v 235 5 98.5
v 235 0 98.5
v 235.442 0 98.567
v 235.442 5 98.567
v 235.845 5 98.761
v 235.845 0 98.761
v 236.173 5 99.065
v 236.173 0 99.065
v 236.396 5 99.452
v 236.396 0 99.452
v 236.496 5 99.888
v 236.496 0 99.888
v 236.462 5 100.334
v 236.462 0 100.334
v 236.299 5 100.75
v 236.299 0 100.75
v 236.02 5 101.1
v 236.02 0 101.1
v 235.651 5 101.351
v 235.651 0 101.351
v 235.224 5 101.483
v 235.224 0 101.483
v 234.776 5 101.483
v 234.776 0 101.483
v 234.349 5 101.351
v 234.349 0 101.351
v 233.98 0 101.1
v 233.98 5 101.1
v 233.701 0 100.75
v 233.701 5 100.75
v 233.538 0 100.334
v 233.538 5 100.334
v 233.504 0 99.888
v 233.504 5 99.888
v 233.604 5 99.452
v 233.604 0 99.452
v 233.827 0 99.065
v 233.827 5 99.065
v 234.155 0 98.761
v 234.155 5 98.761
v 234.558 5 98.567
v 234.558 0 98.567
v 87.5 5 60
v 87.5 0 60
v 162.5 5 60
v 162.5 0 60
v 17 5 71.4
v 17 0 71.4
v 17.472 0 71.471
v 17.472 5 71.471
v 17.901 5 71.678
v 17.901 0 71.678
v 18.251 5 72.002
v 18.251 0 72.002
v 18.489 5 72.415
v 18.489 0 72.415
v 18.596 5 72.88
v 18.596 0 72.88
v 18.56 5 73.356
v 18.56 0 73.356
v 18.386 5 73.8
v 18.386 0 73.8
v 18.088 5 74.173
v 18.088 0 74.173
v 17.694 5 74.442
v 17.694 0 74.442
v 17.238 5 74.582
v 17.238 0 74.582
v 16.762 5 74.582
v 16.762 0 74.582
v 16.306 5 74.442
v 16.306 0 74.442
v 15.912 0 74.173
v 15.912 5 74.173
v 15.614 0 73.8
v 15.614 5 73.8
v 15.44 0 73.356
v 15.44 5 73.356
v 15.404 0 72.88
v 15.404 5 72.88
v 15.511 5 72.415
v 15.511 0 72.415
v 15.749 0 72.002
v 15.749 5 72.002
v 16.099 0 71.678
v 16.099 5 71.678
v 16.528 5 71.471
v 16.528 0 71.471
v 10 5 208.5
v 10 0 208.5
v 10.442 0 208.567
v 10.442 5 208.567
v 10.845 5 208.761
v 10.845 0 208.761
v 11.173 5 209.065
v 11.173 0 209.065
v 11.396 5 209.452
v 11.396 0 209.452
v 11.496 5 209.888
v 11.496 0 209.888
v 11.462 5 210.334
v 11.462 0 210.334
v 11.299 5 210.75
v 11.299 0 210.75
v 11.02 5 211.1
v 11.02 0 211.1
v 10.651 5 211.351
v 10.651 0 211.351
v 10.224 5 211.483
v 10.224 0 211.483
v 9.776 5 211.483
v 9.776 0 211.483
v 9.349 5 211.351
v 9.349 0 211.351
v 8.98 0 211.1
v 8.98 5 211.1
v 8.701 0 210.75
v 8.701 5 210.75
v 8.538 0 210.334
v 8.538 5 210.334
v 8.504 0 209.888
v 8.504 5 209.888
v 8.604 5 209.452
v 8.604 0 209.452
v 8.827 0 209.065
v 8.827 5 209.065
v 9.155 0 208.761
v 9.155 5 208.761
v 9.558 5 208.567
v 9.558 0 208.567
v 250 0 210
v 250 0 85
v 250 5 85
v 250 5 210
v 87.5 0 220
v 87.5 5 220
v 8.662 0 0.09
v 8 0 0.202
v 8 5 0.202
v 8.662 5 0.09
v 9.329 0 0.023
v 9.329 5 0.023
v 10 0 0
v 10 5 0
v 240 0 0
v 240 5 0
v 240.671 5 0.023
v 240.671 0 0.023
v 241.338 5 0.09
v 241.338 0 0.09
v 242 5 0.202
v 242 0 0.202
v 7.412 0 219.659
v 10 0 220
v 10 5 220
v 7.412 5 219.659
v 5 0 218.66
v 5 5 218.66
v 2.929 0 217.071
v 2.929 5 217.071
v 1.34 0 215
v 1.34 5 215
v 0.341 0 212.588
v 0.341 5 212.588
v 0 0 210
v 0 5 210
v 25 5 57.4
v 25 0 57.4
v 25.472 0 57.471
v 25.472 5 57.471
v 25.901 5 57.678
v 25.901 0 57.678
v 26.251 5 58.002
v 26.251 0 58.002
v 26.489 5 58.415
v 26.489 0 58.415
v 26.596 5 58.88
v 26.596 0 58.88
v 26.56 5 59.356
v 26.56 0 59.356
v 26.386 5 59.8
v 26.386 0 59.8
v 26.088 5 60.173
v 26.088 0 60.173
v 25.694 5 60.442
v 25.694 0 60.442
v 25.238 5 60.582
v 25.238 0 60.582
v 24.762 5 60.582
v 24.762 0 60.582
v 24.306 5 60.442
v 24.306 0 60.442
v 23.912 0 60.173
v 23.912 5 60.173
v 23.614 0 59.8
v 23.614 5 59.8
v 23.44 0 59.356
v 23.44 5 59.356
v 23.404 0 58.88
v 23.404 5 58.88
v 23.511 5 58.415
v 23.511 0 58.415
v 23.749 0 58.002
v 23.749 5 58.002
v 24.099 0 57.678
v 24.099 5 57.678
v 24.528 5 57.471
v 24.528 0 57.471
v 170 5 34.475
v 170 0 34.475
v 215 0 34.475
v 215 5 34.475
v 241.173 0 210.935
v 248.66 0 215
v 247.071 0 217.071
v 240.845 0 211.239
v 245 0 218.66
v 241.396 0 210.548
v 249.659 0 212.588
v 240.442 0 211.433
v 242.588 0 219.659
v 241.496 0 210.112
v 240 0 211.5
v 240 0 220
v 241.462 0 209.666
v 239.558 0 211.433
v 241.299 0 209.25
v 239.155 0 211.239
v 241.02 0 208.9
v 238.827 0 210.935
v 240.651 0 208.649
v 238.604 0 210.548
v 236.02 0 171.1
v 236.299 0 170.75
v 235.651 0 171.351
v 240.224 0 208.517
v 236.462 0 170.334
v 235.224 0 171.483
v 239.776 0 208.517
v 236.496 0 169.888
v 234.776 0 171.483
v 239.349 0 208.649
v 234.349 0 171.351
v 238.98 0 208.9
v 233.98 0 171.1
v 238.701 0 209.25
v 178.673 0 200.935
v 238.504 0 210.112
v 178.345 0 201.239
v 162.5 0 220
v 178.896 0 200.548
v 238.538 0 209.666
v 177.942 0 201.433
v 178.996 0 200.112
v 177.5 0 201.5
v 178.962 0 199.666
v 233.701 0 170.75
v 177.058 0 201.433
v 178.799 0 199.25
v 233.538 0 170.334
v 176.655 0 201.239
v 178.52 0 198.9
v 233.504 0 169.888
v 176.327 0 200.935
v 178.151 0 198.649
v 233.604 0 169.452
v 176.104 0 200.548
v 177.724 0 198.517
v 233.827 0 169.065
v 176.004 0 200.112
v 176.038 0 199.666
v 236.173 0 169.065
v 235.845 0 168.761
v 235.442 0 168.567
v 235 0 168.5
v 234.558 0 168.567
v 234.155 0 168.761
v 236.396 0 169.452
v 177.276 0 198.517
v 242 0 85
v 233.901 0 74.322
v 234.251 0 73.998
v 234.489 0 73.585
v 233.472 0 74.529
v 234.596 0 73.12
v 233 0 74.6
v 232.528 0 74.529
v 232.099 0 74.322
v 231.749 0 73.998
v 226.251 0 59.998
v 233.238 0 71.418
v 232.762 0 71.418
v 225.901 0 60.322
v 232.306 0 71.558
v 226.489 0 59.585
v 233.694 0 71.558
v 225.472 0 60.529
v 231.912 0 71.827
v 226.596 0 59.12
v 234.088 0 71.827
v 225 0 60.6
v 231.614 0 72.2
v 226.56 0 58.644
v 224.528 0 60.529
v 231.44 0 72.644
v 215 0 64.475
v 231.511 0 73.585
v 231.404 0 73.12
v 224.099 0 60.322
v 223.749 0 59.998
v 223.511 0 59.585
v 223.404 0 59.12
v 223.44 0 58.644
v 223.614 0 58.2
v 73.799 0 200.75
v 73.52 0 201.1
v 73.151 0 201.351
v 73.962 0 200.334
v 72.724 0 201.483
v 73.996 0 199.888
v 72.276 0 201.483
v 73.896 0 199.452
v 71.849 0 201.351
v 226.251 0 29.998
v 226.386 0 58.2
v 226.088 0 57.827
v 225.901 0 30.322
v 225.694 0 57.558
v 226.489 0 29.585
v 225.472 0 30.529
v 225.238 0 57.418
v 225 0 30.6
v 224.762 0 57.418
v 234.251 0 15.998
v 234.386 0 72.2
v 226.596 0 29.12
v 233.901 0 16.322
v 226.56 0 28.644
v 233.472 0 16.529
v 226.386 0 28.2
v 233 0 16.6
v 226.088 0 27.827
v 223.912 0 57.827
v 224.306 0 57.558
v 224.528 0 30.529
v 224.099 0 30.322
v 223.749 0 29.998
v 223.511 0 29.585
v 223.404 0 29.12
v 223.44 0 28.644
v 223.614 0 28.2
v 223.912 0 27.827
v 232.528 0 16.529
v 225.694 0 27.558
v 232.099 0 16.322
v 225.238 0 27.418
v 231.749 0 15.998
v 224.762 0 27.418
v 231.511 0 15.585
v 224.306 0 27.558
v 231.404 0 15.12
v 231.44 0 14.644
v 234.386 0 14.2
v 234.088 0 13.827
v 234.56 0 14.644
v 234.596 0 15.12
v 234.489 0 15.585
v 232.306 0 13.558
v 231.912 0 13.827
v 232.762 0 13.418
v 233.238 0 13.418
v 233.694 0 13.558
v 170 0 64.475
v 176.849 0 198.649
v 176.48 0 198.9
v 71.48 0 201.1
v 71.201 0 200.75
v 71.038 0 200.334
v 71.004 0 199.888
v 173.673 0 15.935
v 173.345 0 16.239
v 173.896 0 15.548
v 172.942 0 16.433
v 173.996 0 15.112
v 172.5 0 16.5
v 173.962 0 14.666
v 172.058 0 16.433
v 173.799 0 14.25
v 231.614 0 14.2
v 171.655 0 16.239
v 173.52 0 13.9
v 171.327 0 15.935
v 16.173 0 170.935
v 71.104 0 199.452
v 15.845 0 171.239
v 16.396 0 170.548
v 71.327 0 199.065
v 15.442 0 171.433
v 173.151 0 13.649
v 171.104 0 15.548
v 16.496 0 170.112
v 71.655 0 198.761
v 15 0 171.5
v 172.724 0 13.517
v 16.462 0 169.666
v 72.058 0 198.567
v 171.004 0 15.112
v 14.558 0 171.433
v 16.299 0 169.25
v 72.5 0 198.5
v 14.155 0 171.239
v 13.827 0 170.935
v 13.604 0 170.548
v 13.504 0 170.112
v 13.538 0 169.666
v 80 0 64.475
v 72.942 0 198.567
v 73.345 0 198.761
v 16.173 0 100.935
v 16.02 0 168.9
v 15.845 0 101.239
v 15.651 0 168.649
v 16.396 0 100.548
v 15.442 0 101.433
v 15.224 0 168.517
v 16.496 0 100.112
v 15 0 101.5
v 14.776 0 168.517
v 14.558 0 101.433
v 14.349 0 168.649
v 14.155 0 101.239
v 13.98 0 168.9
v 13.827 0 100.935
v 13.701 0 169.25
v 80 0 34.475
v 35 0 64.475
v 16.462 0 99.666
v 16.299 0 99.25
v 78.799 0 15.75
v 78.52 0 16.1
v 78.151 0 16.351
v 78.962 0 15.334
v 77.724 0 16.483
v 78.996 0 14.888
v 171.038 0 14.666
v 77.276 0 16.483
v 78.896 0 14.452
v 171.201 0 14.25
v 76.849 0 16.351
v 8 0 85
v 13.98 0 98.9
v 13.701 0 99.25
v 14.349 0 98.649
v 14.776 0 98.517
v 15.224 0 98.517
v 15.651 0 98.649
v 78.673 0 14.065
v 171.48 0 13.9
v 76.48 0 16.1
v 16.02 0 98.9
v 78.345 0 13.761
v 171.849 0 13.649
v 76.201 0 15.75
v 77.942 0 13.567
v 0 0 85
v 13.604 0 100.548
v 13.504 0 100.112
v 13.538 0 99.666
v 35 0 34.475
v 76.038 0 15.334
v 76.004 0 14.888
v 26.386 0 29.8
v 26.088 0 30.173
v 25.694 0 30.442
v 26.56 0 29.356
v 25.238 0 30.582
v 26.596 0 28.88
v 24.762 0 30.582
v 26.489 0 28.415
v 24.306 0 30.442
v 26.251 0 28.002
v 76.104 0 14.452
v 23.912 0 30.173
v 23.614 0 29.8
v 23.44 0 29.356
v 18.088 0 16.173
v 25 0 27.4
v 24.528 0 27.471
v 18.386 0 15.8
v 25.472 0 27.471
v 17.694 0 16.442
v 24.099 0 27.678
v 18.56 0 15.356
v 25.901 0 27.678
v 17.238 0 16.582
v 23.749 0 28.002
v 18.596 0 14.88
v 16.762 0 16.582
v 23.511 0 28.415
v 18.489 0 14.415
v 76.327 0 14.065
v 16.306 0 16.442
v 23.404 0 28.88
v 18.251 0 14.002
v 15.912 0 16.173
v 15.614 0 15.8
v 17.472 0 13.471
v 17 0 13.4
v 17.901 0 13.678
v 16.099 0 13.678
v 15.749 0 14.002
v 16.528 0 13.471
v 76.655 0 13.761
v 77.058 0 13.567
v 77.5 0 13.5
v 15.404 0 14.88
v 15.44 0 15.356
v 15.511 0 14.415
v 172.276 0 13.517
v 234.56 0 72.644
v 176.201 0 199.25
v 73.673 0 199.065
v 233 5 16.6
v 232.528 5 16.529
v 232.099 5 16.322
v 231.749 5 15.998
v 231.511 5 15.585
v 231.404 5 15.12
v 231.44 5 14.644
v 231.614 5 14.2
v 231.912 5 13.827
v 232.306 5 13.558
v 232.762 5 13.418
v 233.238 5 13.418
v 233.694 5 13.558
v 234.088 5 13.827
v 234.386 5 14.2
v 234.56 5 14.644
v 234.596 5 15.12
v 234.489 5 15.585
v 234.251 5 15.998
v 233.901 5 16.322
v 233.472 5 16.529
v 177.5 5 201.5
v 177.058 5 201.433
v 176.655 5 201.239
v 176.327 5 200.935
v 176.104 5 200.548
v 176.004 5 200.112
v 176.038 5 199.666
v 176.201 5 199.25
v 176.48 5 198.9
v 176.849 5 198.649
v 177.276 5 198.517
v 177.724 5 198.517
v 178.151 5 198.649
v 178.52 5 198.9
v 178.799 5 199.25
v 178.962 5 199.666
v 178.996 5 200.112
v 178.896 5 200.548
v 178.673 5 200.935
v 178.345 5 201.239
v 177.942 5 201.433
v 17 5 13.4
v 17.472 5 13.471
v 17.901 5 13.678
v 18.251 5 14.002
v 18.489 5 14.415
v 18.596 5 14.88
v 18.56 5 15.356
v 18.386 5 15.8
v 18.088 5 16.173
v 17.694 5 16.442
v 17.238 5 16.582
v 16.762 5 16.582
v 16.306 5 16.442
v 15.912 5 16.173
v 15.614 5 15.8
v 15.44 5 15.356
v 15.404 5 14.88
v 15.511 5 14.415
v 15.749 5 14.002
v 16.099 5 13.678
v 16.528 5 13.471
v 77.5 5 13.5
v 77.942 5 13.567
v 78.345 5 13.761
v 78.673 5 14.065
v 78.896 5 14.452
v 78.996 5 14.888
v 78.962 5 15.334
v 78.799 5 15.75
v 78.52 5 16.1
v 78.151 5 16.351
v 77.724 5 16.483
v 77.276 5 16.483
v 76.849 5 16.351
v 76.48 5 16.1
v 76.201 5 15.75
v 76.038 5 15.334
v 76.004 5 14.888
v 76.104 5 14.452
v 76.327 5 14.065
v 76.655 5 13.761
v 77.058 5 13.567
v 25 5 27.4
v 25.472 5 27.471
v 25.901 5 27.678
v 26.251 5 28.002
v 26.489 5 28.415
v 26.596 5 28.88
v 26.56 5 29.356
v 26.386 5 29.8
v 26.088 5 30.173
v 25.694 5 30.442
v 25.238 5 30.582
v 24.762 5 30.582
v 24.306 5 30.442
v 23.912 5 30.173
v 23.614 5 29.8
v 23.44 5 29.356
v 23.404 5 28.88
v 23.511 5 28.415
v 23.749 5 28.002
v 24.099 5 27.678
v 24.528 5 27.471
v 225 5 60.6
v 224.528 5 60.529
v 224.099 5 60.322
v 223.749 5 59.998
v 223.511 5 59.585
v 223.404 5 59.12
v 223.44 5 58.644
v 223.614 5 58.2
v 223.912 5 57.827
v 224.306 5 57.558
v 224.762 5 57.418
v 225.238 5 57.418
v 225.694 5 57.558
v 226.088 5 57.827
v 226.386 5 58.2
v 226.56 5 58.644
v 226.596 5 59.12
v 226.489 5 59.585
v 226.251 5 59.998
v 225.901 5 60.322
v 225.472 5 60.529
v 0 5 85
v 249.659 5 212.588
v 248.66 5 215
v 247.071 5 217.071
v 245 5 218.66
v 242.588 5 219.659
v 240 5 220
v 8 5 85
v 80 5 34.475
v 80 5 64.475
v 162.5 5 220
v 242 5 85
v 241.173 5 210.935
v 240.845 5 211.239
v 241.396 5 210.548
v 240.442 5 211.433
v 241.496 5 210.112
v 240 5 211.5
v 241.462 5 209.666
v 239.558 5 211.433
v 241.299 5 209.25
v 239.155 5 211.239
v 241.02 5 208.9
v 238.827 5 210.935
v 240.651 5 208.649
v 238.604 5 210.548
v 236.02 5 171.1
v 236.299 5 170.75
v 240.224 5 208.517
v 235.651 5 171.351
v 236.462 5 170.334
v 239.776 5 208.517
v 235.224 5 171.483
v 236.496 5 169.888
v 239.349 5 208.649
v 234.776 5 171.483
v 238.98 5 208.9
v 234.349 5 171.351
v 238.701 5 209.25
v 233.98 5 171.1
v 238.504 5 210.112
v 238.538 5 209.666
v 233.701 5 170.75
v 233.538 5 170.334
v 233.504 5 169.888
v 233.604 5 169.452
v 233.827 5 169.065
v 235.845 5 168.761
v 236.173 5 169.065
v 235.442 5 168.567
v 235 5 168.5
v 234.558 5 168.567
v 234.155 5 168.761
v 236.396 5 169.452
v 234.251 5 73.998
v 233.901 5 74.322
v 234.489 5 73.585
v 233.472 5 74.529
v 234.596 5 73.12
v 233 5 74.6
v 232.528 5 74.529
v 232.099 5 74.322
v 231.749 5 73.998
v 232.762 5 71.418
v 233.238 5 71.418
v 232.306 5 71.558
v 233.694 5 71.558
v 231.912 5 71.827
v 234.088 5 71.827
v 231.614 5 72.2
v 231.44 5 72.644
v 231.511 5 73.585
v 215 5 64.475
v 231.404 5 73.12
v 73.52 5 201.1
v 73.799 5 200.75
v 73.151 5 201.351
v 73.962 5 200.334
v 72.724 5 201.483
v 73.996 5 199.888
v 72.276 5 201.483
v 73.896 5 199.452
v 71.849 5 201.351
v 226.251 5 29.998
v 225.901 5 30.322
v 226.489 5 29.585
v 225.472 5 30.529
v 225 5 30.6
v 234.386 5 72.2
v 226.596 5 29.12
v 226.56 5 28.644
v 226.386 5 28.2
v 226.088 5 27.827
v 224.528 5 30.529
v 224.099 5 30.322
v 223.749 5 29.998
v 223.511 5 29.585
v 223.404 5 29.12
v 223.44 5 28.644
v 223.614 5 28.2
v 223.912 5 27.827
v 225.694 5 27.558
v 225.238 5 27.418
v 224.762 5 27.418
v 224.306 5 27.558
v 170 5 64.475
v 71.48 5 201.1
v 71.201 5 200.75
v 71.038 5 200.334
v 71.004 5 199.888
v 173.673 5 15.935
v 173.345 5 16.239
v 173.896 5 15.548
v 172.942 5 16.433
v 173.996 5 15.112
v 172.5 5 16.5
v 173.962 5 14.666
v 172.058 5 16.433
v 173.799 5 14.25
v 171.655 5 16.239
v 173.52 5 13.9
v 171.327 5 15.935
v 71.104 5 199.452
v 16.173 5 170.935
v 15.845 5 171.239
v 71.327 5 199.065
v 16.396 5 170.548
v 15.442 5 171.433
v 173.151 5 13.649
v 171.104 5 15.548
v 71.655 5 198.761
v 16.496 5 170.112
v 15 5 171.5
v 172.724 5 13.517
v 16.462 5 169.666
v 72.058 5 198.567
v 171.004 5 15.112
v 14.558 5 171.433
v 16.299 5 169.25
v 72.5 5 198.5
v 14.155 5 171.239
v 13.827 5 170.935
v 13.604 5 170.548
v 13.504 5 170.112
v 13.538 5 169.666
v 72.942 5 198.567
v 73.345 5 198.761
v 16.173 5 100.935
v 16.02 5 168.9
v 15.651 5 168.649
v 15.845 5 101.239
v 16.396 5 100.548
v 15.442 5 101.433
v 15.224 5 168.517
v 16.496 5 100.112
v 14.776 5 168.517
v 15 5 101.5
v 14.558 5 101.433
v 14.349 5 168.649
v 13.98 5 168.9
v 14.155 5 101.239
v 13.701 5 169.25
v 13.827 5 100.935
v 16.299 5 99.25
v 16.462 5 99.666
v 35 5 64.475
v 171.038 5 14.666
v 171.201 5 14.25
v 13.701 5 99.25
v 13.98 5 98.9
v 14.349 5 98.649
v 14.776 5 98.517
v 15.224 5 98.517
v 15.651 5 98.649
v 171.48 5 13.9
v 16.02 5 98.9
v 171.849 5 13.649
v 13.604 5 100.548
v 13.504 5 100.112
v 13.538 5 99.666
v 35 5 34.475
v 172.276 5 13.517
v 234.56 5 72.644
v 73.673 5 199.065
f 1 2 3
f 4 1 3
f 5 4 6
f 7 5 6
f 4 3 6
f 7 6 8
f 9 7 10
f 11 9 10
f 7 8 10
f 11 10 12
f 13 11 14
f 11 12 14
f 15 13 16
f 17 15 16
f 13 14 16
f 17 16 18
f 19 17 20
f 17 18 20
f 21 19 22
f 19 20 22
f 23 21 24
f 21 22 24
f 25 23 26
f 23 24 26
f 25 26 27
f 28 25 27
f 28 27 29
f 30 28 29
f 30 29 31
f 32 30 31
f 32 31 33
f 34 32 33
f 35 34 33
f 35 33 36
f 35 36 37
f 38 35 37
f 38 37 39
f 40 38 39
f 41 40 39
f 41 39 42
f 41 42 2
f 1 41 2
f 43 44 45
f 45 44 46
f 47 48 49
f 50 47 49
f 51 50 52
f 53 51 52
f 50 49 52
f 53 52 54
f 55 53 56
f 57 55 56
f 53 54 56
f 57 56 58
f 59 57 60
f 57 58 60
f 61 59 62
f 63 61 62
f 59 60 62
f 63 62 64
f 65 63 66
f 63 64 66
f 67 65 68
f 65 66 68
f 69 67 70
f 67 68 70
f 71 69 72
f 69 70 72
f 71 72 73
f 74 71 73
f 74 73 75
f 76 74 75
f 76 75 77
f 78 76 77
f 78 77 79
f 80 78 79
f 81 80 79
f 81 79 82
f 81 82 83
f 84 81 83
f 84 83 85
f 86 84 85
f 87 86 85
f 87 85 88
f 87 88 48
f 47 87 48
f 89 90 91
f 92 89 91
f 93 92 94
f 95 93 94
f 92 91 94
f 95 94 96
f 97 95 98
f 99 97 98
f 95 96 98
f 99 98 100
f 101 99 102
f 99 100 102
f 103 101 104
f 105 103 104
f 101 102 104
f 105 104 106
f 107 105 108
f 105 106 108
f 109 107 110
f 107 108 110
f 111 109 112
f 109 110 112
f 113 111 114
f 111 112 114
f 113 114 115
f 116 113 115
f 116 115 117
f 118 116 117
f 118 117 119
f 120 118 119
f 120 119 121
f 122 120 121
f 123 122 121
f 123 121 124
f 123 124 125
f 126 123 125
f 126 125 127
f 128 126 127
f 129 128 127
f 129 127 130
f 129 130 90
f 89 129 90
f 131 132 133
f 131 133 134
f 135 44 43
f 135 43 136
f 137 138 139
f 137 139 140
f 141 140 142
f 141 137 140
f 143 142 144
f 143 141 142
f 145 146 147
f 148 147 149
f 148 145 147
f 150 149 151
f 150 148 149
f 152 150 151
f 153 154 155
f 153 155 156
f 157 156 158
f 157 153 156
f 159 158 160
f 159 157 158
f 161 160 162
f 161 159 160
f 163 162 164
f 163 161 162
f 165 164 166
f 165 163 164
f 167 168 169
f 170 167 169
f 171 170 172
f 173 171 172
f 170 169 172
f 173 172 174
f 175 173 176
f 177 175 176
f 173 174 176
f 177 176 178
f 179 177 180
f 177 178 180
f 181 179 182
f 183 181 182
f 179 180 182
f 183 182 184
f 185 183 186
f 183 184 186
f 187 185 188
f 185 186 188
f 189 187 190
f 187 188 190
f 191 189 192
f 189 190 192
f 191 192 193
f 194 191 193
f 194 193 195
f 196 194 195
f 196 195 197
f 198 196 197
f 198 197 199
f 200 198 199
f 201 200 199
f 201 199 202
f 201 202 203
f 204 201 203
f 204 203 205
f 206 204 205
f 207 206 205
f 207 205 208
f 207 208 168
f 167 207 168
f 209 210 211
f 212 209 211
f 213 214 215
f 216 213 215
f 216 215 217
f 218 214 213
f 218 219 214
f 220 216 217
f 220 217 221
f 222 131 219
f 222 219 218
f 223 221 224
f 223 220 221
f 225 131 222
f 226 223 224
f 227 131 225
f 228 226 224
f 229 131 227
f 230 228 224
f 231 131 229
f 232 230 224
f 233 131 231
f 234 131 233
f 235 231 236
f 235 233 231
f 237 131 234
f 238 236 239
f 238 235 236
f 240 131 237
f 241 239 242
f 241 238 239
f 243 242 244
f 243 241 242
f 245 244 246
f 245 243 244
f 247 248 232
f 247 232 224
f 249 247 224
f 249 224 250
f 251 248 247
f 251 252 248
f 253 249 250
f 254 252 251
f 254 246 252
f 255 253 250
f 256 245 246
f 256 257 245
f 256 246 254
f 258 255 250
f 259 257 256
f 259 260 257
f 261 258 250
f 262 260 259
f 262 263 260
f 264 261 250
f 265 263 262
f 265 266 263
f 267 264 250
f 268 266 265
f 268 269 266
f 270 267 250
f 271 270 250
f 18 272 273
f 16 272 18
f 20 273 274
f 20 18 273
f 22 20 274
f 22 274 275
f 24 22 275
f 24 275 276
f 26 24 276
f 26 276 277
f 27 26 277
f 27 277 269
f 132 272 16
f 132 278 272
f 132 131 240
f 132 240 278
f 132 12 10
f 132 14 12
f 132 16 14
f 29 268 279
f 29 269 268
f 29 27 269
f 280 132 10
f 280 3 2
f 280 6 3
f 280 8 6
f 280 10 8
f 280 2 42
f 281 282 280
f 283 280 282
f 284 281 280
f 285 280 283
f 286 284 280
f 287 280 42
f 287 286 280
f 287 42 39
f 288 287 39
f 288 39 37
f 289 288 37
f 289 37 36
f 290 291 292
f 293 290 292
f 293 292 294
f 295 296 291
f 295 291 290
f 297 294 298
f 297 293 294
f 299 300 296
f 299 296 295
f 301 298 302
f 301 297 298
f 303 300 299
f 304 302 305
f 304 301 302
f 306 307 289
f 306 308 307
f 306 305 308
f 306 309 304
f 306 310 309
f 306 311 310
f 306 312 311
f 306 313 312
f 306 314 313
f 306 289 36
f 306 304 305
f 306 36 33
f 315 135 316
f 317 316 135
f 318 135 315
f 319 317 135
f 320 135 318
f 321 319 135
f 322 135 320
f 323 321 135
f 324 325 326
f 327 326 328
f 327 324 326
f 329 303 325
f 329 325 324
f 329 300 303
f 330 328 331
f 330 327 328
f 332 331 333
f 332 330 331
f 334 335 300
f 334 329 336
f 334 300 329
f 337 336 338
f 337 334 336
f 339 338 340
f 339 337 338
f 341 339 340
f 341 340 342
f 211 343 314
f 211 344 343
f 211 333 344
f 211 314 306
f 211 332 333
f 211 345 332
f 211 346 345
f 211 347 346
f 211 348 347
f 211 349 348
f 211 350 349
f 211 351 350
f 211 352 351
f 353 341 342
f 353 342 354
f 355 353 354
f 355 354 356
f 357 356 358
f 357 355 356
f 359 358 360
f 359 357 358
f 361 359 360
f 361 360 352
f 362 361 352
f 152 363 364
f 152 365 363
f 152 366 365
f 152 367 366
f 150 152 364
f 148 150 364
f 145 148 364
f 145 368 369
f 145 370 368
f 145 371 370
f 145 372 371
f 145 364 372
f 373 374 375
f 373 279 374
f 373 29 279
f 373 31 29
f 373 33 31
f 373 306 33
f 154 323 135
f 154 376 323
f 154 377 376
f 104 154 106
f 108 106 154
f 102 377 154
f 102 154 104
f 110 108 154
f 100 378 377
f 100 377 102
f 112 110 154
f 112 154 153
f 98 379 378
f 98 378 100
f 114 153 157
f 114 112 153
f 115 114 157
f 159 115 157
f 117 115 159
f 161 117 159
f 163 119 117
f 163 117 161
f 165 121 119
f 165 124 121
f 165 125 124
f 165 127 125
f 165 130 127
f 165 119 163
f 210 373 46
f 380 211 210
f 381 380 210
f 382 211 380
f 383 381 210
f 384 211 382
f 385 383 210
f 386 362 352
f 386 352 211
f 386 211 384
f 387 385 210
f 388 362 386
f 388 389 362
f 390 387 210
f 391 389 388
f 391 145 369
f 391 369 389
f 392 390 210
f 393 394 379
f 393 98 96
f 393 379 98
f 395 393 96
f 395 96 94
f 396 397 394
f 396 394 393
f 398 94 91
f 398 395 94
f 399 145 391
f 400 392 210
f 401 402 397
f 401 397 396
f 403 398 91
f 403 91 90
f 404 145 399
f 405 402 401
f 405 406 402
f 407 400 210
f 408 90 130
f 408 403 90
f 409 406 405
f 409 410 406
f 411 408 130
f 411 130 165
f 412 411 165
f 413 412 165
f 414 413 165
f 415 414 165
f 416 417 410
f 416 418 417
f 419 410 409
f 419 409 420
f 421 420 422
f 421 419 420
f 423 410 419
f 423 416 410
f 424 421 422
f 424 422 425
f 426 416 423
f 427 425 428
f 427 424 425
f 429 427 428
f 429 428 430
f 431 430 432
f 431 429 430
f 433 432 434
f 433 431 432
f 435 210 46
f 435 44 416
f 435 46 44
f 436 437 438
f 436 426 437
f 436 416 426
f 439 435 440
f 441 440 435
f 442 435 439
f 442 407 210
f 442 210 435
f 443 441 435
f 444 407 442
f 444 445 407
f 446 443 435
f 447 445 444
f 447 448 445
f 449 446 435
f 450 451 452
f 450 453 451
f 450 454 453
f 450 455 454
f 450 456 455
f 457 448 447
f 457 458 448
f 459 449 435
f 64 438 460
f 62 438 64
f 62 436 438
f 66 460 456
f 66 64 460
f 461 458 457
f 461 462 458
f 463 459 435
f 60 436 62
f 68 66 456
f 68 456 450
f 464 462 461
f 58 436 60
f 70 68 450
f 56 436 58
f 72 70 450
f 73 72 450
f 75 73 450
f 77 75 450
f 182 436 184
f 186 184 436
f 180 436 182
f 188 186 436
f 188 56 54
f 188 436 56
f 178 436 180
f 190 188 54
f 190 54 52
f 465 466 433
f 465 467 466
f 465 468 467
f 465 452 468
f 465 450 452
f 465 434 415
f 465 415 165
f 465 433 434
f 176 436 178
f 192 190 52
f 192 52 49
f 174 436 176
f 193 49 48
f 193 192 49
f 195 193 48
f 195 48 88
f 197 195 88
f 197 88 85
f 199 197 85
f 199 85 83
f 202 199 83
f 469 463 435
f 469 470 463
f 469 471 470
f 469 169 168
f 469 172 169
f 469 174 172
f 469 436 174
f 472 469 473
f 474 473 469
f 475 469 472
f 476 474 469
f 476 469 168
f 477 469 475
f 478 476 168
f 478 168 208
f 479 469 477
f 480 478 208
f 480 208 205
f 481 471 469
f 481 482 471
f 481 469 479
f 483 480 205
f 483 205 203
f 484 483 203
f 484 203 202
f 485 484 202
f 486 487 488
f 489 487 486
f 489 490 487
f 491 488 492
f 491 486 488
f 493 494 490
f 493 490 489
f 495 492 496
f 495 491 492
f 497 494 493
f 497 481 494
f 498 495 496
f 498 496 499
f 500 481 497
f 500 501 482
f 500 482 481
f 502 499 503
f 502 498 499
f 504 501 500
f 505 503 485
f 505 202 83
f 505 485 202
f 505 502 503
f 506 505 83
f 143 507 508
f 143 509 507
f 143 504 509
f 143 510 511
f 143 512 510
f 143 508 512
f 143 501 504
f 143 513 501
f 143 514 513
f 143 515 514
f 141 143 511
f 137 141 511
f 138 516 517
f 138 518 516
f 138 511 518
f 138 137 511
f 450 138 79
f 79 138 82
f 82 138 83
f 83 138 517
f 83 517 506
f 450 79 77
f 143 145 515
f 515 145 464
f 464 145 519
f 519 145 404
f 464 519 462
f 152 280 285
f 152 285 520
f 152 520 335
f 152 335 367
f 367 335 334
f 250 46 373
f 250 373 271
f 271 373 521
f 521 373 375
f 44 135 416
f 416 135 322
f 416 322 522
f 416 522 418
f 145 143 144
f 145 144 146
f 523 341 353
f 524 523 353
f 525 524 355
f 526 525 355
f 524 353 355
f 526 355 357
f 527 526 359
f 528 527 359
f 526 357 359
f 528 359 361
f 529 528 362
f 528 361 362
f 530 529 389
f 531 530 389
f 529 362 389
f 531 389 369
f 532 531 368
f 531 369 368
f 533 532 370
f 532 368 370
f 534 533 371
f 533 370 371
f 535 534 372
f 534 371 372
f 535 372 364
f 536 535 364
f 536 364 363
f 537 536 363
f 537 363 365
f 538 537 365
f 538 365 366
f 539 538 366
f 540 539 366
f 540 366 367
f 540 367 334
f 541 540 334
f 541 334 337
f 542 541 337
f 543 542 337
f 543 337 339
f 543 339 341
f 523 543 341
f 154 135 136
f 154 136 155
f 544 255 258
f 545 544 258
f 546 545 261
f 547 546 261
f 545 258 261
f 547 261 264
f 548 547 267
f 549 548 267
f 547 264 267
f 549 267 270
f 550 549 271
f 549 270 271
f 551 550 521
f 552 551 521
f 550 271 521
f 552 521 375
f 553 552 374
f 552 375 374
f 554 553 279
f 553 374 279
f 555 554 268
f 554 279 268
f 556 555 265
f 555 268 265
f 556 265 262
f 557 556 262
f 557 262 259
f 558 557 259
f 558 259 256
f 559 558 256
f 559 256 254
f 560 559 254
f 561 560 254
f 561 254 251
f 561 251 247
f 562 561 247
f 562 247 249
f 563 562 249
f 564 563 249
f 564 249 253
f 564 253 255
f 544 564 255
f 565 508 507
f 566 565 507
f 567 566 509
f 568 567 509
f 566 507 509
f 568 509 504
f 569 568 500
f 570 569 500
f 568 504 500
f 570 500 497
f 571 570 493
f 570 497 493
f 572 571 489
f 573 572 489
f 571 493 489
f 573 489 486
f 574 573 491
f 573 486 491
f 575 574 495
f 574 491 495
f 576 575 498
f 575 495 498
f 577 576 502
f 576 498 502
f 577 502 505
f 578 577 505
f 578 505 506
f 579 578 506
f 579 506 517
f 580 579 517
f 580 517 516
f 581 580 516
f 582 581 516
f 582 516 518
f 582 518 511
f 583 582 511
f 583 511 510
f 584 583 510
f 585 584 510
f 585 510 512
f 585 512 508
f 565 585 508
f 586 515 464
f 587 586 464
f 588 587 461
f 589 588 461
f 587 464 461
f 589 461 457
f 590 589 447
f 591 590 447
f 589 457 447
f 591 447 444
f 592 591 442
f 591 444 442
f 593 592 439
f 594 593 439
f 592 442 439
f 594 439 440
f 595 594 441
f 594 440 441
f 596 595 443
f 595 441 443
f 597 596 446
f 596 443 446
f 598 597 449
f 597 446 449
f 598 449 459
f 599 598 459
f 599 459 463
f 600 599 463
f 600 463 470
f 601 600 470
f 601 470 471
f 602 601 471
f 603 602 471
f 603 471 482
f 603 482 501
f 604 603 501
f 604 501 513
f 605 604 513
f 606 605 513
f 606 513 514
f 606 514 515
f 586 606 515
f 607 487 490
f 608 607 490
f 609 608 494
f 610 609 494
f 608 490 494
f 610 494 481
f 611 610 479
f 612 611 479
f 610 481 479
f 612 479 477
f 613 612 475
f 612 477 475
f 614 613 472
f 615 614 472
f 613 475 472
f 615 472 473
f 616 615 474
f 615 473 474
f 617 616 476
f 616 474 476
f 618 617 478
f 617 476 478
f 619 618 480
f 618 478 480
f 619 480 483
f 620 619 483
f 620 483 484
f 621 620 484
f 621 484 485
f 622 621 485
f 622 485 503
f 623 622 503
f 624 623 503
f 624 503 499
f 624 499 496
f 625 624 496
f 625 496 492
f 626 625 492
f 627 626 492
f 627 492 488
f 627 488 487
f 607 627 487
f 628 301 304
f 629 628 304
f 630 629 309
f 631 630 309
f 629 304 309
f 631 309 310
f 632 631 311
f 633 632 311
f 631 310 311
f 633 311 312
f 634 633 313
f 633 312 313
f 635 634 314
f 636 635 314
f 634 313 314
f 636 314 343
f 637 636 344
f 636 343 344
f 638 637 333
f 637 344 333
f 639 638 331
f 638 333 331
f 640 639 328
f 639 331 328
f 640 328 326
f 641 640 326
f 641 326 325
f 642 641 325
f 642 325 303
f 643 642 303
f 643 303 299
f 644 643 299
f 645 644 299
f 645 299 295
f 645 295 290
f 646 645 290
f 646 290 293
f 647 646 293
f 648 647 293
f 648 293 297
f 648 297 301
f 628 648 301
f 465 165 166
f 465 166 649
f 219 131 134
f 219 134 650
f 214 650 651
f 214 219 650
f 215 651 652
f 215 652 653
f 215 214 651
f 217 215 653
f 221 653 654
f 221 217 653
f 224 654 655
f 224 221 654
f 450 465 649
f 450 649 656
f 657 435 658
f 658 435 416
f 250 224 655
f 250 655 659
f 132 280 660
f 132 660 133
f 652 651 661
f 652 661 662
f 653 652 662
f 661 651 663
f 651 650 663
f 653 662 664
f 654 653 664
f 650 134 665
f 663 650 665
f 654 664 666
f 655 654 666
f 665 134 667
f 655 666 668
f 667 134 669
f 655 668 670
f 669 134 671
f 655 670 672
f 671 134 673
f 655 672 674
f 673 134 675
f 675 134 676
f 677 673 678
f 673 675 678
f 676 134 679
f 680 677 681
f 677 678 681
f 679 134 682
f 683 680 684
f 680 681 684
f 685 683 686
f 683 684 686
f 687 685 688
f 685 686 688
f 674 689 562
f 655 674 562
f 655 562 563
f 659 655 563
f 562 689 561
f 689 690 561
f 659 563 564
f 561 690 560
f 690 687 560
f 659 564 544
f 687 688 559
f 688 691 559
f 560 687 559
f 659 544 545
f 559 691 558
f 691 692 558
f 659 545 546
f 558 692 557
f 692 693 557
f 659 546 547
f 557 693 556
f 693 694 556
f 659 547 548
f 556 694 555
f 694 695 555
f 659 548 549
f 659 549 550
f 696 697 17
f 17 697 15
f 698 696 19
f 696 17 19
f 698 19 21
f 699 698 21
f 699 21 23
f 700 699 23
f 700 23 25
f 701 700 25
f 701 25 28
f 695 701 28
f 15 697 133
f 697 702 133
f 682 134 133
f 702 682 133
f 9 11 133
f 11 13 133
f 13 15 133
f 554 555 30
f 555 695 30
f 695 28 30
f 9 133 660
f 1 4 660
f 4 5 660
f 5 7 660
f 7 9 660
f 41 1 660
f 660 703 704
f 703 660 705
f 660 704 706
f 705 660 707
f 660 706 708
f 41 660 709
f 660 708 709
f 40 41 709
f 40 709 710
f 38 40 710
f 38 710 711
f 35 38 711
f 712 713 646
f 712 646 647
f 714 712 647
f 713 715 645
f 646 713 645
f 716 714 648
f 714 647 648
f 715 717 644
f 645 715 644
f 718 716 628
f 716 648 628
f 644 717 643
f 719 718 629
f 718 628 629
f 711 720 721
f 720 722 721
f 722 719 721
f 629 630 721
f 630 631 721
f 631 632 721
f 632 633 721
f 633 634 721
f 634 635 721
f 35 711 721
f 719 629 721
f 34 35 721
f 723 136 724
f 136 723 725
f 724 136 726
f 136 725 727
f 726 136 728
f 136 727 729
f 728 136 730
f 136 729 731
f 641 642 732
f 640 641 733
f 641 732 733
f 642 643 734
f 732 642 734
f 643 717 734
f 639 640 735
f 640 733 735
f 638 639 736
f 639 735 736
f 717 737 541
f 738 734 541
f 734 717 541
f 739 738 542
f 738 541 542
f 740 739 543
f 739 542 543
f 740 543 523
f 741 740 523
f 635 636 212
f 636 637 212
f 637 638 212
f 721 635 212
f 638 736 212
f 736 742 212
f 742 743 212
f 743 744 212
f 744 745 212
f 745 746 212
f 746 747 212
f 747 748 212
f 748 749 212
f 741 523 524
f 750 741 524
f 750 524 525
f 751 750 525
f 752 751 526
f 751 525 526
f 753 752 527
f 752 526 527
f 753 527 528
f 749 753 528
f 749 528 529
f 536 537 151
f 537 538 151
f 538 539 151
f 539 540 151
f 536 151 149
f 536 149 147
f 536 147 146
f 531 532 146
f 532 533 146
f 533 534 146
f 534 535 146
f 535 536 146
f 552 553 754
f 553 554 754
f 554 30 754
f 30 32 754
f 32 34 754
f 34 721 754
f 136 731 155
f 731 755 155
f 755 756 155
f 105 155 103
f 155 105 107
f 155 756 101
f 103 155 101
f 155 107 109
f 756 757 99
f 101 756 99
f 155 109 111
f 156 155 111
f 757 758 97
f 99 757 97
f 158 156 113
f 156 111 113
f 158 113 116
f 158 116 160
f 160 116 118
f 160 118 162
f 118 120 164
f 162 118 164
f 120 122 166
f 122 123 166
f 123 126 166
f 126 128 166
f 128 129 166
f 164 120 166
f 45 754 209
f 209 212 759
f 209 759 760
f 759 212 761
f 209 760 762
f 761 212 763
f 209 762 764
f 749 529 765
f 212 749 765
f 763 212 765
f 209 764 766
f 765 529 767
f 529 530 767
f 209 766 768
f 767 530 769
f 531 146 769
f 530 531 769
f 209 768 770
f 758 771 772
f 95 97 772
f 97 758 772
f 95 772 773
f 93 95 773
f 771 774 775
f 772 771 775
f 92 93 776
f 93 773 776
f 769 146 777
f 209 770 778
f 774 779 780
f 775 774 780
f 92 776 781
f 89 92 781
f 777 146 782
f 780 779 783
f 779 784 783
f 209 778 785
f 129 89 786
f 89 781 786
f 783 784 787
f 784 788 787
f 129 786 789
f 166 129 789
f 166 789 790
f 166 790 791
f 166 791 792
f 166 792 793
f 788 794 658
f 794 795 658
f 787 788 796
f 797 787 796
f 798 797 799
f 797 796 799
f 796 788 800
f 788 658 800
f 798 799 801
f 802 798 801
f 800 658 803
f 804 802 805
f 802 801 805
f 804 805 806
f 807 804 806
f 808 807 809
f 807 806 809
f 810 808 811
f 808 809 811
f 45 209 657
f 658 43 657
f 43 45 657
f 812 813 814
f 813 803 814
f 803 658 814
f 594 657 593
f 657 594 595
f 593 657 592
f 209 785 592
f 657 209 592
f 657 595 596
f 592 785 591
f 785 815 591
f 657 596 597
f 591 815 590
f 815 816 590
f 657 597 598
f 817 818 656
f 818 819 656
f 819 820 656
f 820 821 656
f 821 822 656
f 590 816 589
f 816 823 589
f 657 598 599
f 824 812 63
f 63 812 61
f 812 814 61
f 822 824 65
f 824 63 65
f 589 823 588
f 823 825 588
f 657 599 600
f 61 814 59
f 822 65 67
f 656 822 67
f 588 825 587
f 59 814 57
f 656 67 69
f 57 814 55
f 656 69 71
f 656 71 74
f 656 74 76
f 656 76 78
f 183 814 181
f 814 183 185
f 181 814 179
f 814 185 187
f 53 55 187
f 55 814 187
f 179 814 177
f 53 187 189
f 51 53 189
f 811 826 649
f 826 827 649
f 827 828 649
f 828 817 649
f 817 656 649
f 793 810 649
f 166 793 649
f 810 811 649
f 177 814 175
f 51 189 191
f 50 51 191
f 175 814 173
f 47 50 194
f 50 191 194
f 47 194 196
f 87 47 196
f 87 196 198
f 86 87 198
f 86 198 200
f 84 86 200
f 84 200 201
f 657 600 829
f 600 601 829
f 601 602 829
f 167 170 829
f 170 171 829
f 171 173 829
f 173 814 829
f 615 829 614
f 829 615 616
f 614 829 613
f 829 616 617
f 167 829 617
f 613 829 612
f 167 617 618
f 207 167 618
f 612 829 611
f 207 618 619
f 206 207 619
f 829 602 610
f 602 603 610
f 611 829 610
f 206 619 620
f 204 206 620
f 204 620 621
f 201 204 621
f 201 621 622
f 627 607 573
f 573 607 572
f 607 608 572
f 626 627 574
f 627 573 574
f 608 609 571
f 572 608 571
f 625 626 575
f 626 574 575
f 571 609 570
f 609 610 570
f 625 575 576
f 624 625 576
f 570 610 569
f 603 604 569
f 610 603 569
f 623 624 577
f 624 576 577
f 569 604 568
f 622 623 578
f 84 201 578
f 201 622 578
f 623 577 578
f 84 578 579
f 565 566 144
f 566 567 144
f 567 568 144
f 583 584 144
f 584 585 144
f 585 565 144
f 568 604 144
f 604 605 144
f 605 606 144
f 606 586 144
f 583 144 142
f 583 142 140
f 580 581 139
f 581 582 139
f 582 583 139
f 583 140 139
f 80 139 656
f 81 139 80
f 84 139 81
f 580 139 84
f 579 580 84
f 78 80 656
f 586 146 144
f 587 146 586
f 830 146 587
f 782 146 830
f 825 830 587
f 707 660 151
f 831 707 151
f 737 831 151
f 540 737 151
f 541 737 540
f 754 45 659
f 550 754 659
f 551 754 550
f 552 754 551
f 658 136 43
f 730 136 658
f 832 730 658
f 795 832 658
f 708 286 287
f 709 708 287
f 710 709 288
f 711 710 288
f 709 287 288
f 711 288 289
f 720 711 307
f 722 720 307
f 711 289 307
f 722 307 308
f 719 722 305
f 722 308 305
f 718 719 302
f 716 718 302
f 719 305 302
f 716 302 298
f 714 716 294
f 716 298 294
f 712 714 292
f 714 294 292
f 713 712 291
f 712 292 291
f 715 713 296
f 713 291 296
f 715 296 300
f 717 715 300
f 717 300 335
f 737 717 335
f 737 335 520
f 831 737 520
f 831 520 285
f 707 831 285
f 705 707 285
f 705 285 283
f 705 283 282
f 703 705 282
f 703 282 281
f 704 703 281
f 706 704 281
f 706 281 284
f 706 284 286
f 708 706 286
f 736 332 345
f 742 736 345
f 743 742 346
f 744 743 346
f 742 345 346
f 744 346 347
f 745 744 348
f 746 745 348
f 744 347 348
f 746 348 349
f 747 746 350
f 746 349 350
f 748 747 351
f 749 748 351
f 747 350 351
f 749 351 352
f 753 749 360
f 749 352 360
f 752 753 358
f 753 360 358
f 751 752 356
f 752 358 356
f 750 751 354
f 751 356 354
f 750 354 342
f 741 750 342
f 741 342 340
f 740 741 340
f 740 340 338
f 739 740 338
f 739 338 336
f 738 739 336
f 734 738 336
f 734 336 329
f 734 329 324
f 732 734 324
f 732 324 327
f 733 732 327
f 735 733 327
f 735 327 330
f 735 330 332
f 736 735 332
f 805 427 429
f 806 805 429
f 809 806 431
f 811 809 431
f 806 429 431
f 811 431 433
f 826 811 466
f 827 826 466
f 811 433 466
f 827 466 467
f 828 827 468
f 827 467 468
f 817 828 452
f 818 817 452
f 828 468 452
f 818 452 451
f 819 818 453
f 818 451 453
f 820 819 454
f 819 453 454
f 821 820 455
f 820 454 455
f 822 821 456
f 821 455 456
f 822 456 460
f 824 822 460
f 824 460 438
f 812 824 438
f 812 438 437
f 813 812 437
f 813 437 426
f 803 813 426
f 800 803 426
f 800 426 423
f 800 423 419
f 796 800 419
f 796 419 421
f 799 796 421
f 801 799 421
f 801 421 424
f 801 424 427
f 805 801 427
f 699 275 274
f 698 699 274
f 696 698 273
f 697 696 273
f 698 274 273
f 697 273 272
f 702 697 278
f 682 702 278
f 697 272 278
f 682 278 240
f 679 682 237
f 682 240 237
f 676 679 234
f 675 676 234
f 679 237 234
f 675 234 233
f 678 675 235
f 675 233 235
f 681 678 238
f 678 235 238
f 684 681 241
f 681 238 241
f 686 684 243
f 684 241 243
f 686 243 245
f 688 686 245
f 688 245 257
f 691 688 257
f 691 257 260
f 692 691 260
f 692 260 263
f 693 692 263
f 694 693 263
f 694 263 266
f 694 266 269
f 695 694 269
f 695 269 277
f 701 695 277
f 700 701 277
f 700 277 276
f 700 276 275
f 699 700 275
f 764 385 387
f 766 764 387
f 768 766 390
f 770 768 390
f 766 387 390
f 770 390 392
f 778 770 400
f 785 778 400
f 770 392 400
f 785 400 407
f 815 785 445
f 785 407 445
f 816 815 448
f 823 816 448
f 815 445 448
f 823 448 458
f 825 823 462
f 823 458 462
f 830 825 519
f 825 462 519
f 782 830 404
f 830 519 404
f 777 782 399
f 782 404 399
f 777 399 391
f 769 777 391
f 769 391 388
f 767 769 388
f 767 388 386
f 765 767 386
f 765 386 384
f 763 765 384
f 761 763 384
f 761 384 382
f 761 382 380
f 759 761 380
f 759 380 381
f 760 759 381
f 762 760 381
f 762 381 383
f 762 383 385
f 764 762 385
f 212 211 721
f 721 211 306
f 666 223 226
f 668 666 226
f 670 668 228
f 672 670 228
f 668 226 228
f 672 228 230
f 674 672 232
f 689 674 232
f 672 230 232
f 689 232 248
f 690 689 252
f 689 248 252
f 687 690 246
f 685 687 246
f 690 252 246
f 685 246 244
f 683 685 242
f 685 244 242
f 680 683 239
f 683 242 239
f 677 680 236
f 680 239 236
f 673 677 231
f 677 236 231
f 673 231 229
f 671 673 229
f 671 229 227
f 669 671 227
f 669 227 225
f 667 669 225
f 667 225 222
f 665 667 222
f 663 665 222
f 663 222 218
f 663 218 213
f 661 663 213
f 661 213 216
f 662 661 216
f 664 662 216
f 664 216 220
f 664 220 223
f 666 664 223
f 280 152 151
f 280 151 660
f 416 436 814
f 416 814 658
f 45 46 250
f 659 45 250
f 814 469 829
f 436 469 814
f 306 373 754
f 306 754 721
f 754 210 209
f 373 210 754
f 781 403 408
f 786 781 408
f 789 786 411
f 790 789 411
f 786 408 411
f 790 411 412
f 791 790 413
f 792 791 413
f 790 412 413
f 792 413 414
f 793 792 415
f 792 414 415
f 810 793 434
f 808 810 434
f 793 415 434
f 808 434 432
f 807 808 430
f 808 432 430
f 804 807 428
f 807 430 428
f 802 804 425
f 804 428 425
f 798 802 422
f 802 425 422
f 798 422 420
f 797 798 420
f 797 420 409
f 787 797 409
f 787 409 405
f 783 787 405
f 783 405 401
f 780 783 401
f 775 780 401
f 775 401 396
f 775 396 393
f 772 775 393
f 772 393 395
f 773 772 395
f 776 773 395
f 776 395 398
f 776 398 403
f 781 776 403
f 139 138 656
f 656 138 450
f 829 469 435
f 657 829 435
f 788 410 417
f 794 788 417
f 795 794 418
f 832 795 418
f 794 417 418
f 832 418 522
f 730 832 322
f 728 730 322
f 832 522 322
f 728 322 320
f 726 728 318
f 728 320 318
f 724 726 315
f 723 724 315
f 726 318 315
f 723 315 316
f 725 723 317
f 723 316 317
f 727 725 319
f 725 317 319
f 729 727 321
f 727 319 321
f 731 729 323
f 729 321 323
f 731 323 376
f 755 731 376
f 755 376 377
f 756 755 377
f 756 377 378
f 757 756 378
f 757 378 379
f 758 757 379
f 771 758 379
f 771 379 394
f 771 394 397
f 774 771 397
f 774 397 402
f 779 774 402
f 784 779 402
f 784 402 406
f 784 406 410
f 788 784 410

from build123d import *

# Parameters (mm, degrees)
EXTRUDE_1_DEPTH      = 5
SKETCH_4_W           = 45
SKETCH_4_H           = 30
CUT_EXTRUDE_3_DEPTH  = 5
SKETCH_5_W           = 75
SKETCH_5_H           = 160
CUT_EXTRUDE_4_DEPTH  = 5
CUT_EXTRUDE_5_REACH  = 335.054
SKETCH_6_R           = 1.5
CUT_EXTRUDE_7_REACH  = 335.054
SKETCH_7_R           = 1.6
CUT_EXTRUDE_8_REACH  = 335.054
SKETCH_8_R           = 1.5
CUT_EXTRUDE_9_REACH  = 335.054
SKETCH_9_R           = 1.5
CUT_EXTRUDE_10_REACH = 335.054
SKETCH_10_W          = 8
SKETCH_10_H          = 85


with BuildPart() as part:
    # 草图1 → 凸台-拉伸1 (new body)
    with BuildSketch(Plane(origin=(0, 0, 0), x_dir=(1, 0, 0), z_dir=(0, 1, 0))):
        with BuildLine():
            Line((10, 0), (240, 0))
            ThreePointArc((240, 0), (247.071067812, -2.928932188), (250, -10))
            Line((250, -10), (250, -210))
            ThreePointArc((250, -210), (247.071067812, -217.071067812), (240, -220))
            Line((240, -220), (10, -220))
            ThreePointArc((10, -220), (2.928932188, -217.071067812), (0, -210))
            Line((0, -210), (0, -10))
            ThreePointArc((0, -10), (2.928932188, -2.928932188), (10, 0))
        make_face()
    extrude(amount=EXTRUDE_1_DEPTH)

    # 草图4 → 切除-拉伸3 (cut)
    with BuildSketch(Plane.XZ):
        with Locations((192.5, 49.475)):
            Rectangle(SKETCH_4_W, SKETCH_4_H)
        with Locations((57.5, 49.475)):
            Rectangle(SKETCH_4_W, SKETCH_4_H)
    extrude(amount=-CUT_EXTRUDE_3_DEPTH, mode=Mode.SUBTRACT)

    # 草图5 → 切除-拉伸4 (cut)
    with BuildSketch(Plane.XZ):
        with Locations((125, 140)):
            Rectangle(SKETCH_5_W, SKETCH_5_H)
    extrude(amount=-CUT_EXTRUDE_4_DEPTH, mode=Mode.SUBTRACT)

    # 草图6 → 切除-拉伸5 (cut, up to next)
    with BuildSketch(Plane.XZ, mode=Mode.PRIVATE) as cut_extrude_5_sk1:
        with Locations(Location((72.5, 200, 0), (0, 0, 270))):
            Circle(SKETCH_6_R)
    cut_extrude_5_tool1 = extrude(cut_extrude_5_sk1.sketch, amount=-CUT_EXTRUDE_5_REACH, mode=Mode.PRIVATE) & part.part
    # 草图6 → 切除-拉伸5 (cut, up to next)
    with BuildSketch(Plane.XZ, mode=Mode.PRIVATE) as cut_extrude_5_sk2:
        with Locations(Location((177.5, 200, 0), (0, 0, 90))):
            Circle(SKETCH_6_R)
    cut_extrude_5_tool2 = extrude(cut_extrude_5_sk2.sketch, amount=-CUT_EXTRUDE_5_REACH, mode=Mode.PRIVATE) & part.part
    add(cut_extrude_5_tool1.solids().sort_by_distance((72.5, 0, 200))[0], mode=Mode.SUBTRACT)
    add(cut_extrude_5_tool2.solids().sort_by_distance((177.5, 0, 200))[0], mode=Mode.SUBTRACT)

    # 草图7 → 切除-拉伸7 (cut, up to next)
    with BuildSketch(Plane.XZ, mode=Mode.PRIVATE) as cut_extrude_7_sk1:
        with Locations(Location((17, 15, 0), (0, 0, 270))):
            Circle(SKETCH_7_R)
    cut_extrude_7_tool1 = extrude(cut_extrude_7_sk1.sketch, amount=-CUT_EXTRUDE_7_REACH, mode=Mode.PRIVATE) & part.part
    # 草图7 → 切除-拉伸7 (cut, up to next)
    with BuildSketch(Plane.XZ, mode=Mode.PRIVATE) as cut_extrude_7_sk2:
        with Locations(Location((25, 29, 0), (0, 0, 270))):
            Circle(SKETCH_7_R)
    cut_extrude_7_tool2 = extrude(cut_extrude_7_sk2.sketch, amount=-CUT_EXTRUDE_7_REACH, mode=Mode.PRIVATE) & part.part
    # 草图7 → 切除-拉伸7 (cut, up to next)
    with BuildSketch(Plane.XZ, mode=Mode.PRIVATE) as cut_extrude_7_sk3:
        with Locations(Location((25, 59, 0), (0, 0, 270))):
            Circle(SKETCH_7_R)
    cut_extrude_7_tool3 = extrude(cut_extrude_7_sk3.sketch, amount=-CUT_EXTRUDE_7_REACH, mode=Mode.PRIVATE) & part.part
    # 草图7 → 切除-拉伸7 (cut, up to next)
    with BuildSketch(Plane.XZ, mode=Mode.PRIVATE) as cut_extrude_7_sk4:
        with Locations(Location((17, 73, 0), (0, 0, 270))):
            Circle(SKETCH_7_R)
    cut_extrude_7_tool4 = extrude(cut_extrude_7_sk4.sketch, amount=-CUT_EXTRUDE_7_REACH, mode=Mode.PRIVATE) & part.part
    # 草图7 → 切除-拉伸7 (cut, up to next)
    with BuildSketch(Plane.XZ, mode=Mode.PRIVATE) as cut_extrude_7_sk5:
        with Locations(Location((233, 73, 0), (0, 0, 90))):
            Circle(SKETCH_7_R)
    cut_extrude_7_tool5 = extrude(cut_extrude_7_sk5.sketch, amount=-CUT_EXTRUDE_7_REACH, mode=Mode.PRIVATE) & part.part
    # 草图7 → 切除-拉伸7 (cut, up to next)
    with BuildSketch(Plane.XZ, mode=Mode.PRIVATE) as cut_extrude_7_sk6:
        with Locations(Location((225, 59, 0), (0, 0, 90))):
            Circle(SKETCH_7_R)
    cut_extrude_7_tool6 = extrude(cut_extrude_7_sk6.sketch, amount=-CUT_EXTRUDE_7_REACH, mode=Mode.PRIVATE) & part.part
    # 草图7 → 切除-拉伸7 (cut, up to next)
    with BuildSketch(Plane.XZ, mode=Mode.PRIVATE) as cut_extrude_7_sk7:
        with Locations(Location((225, 29, 0), (0, 0, 90))):
            Circle(SKETCH_7_R)
    cut_extrude_7_tool7 = extrude(cut_extrude_7_sk7.sketch, amount=-CUT_EXTRUDE_7_REACH, mode=Mode.PRIVATE) & part.part
    # 草图7 → 切除-拉伸7 (cut, up to next)
    with BuildSketch(Plane.XZ, mode=Mode.PRIVATE) as cut_extrude_7_sk8:
        with Locations(Location((233, 15, 0), (0, 0, 90))):
            Circle(SKETCH_7_R)
    cut_extrude_7_tool8 = extrude(cut_extrude_7_sk8.sketch, amount=-CUT_EXTRUDE_7_REACH, mode=Mode.PRIVATE) & part.part
    add(cut_extrude_7_tool1.solids().sort_by_distance((17, 0, 15))[0], mode=Mode.SUBTRACT)
    add(cut_extrude_7_tool2.solids().sort_by_distance((25, 0, 29))[0], mode=Mode.SUBTRACT)
    add(cut_extrude_7_tool3.solids().sort_by_distance((25, 0, 59))[0], mode=Mode.SUBTRACT)
    add(cut_extrude_7_tool4.solids().sort_by_distance((17, 0, 73))[0], mode=Mode.SUBTRACT)
    add(cut_extrude_7_tool5.solids().sort_by_distance((233, 0, 73))[0], mode=Mode.SUBTRACT)
    add(cut_extrude_7_tool6.solids().sort_by_distance((225, 0, 59))[0], mode=Mode.SUBTRACT)
    add(cut_extrude_7_tool7.solids().sort_by_distance((225, 0, 29))[0], mode=Mode.SUBTRACT)
    add(cut_extrude_7_tool8.solids().sort_by_distance((233, 0, 15))[0], mode=Mode.SUBTRACT)

    # 草图8 → 切除-拉伸8 (cut, up to next)
    with BuildSketch(Plane.XZ, mode=Mode.PRIVATE) as cut_extrude_8_sk1:
        with Locations(Location((235, 170, 0), (0, 0, 270))):
            Circle(SKETCH_8_R)
    cut_extrude_8_tool1 = extrude(cut_extrude_8_sk1.sketch, amount=-CUT_EXTRUDE_8_REACH, mode=Mode.PRIVATE) & part.part
    # 草图8 → 切除-拉伸8 (cut, up to next)
    with BuildSketch(Plane.XZ, mode=Mode.PRIVATE) as cut_extrude_8_sk2:
        with Locations(Location((235, 100, 0), (0, 0, 270))):
            Circle(SKETCH_8_R)
    cut_extrude_8_tool2 = extrude(cut_extrude_8_sk2.sketch, amount=-CUT_EXTRUDE_8_REACH, mode=Mode.PRIVATE) & part.part
    # 草图8 → 切除-拉伸8 (cut, up to next)
    with BuildSketch(Plane.XZ, mode=Mode.PRIVATE) as cut_extrude_8_sk3:
        with Locations(Location((15, 100, 0), (0, 0, 90))):
            Circle(SKETCH_8_R)
    cut_extrude_8_tool3 = extrude(cut_extrude_8_sk3.sketch, amount=-CUT_EXTRUDE_8_REACH, mode=Mode.PRIVATE) & part.part
    # 草图8 → 切除-拉伸8 (cut, up to next)
    with BuildSketch(Plane.XZ, mode=Mode.PRIVATE) as cut_extrude_8_sk4:
        with Locations(Location((15, 170, 0), (0, 0, 90))):
            Circle(SKETCH_8_R)
    cut_extrude_8_tool4 = extrude(cut_extrude_8_sk4.sketch, amount=-CUT_EXTRUDE_8_REACH, mode=Mode.PRIVATE) & part.part
    add(cut_extrude_8_tool1.solids().sort_by_distance((235, 0, 170))[0], mode=Mode.SUBTRACT)
    add(cut_extrude_8_tool2.solids().sort_by_distance((235, 0, 100))[0], mode=Mode.SUBTRACT)
    add(cut_extrude_8_tool3.solids().sort_by_distance((15, 0, 100))[0], mode=Mode.SUBTRACT)
    add(cut_extrude_8_tool4.solids().sort_by_distance((15, 0, 170))[0], mode=Mode.SUBTRACT)

    # 草图9 → 切除-拉伸9 (cut, up to next)
    with BuildSketch(Plane.XZ, mode=Mode.PRIVATE) as cut_extrude_9_sk1:
        with Locations(Location((77.5, 15, 0), (0, 0, 270))):
            Circle(SKETCH_9_R)
    cut_extrude_9_tool1 = extrude(cut_extrude_9_sk1.sketch, amount=-CUT_EXTRUDE_9_REACH, mode=Mode.PRIVATE) & part.part
    # 草图9 → 切除-拉伸9 (cut, up to next)
    with BuildSketch(Plane.XZ, mode=Mode.PRIVATE) as cut_extrude_9_sk2:
        with Locations(Location((10, 210, 0), (0, 0, 270))):
            Circle(SKETCH_9_R)
    cut_extrude_9_tool2 = extrude(cut_extrude_9_sk2.sketch, amount=-CUT_EXTRUDE_9_REACH, mode=Mode.PRIVATE) & part.part
    # 草图9 → 切除-拉伸9 (cut, up to next)
    with BuildSketch(Plane.XZ, mode=Mode.PRIVATE) as cut_extrude_9_sk3:
        with Locations(Location((240, 210, 0), (0, 0, 90))):
            Circle(SKETCH_9_R)
    cut_extrude_9_tool3 = extrude(cut_extrude_9_sk3.sketch, amount=-CUT_EXTRUDE_9_REACH, mode=Mode.PRIVATE) & part.part
    # 草图9 → 切除-拉伸9 (cut, up to next)
    with BuildSketch(Plane.XZ, mode=Mode.PRIVATE) as cut_extrude_9_sk4:
        with Locations(Location((172.5, 15, 0), (0, 0, 90))):
            Circle(SKETCH_9_R)
    cut_extrude_9_tool4 = extrude(cut_extrude_9_sk4.sketch, amount=-CUT_EXTRUDE_9_REACH, mode=Mode.PRIVATE) & part.part
    add(cut_extrude_9_tool1.solids().sort_by_distance((77.5, 0, 15))[0], mode=Mode.SUBTRACT)
    add(cut_extrude_9_tool2.solids().sort_by_distance((10, 0, 210))[0], mode=Mode.SUBTRACT)
    add(cut_extrude_9_tool3.solids().sort_by_distance((240, 0, 210))[0], mode=Mode.SUBTRACT)
    add(cut_extrude_9_tool4.solids().sort_by_distance((172.5, 0, 15))[0], mode=Mode.SUBTRACT)

    # 草图10 → 切除-拉伸10 (cut, up to next)
    with BuildSketch(Plane.XZ, mode=Mode.PRIVATE) as cut_extrude_10_sk1:
        with Locations((4, 42.5)):
            Rectangle(SKETCH_10_W, SKETCH_10_H)
    cut_extrude_10_tool1 = extrude(cut_extrude_10_sk1.sketch, amount=-CUT_EXTRUDE_10_REACH, mode=Mode.PRIVATE) & part.part
    # 草图10 → 切除-拉伸10 (cut, up to next)
    with BuildSketch(Plane.XZ, mode=Mode.PRIVATE) as cut_extrude_10_sk2:
        with Locations((246, 42.5)):
            Rectangle(SKETCH_10_W, SKETCH_10_H)
    cut_extrude_10_tool2 = extrude(cut_extrude_10_sk2.sketch, amount=-CUT_EXTRUDE_10_REACH, mode=Mode.PRIVATE) & part.part
    add(cut_extrude_10_tool1.solids().sort_by_distance((4, 0, 42.5))[0], mode=Mode.SUBTRACT)
    add(cut_extrude_10_tool2.solids().sort_by_distance((246, 0, 42.5))[0], mode=Mode.SUBTRACT)


solid = part.part
